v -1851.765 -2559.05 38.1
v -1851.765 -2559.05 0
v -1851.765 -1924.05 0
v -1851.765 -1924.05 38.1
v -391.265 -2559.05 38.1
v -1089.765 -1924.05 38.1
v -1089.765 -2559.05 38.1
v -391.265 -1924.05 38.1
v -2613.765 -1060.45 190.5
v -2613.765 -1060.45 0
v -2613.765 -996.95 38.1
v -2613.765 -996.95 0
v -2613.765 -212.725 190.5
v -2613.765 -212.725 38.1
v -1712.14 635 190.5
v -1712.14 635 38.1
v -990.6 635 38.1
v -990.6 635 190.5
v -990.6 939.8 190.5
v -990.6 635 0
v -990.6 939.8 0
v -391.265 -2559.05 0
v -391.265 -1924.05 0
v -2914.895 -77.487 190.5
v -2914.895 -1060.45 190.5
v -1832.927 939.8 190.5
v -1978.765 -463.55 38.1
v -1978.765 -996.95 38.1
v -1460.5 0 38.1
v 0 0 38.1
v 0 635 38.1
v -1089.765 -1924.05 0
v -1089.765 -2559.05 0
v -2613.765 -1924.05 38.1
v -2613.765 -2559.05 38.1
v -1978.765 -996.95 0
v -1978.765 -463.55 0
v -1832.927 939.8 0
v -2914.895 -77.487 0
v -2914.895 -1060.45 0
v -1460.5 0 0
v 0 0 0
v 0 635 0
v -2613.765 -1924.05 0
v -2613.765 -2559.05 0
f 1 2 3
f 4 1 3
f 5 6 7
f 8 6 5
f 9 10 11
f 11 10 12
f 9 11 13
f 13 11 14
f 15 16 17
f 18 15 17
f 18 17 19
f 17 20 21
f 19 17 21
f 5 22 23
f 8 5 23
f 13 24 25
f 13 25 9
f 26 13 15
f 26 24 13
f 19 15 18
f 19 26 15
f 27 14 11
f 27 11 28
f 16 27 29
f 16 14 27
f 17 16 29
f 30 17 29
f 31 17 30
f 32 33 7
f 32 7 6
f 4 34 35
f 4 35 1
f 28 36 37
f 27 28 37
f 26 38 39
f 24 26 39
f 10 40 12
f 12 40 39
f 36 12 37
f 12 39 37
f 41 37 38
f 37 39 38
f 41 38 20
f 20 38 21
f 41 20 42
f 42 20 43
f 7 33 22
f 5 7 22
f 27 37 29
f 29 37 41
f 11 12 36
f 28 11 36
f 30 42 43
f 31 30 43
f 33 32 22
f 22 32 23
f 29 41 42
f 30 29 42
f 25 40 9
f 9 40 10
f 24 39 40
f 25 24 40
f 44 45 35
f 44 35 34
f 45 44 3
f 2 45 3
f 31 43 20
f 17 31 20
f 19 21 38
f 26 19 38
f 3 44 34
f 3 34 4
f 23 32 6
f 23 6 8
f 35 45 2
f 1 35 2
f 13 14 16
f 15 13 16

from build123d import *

# Parameters (mm, degrees)
F1_DEPTH = 38.1
F2_DEPTH = 190.5
F3_W     = 762
F3_H     = 635
F4_DEPTH = 38.1
F3_W_2   = 698.5


# Not quite as in the source:
# - a feature names something its author has since deleted; it is built from what else it names


with BuildPart() as f1:
    # F0 (on Top) → F1 (new body)
    with BuildSketch(Plane.XY):
        Polygon((-1460.5, 0), (0, 0), (0, 635), (-990.6, 635), (-1712.1399633702, 635), (-2613.764655485, -212.725), (-2613.764655485, -996.95), (-1978.764655485, -996.95), (-1978.764655485, -463.55), align=None)
    extrude(amount=F1_DEPTH)

    # F0 (on Top) → F2 (join)
    with BuildSketch(Plane.XY):
        Polygon((-1712.1399633702, 635), (-990.6, 635), (-990.6, 939.8), (-1832.9271457878, 939.8), (-2914.8946478161, -77.4868031215), (-2914.8946478161, -1060.45), (-2613.764655485, -1060.45), (-2613.764655485, -996.95), (-2613.764655485, -212.725), align=None)
    extrude(amount=F2_DEPTH)


with BuildPart() as f4:
    # F3 (on Top) → F4 (new body)
    with BuildSketch(Plane.XY):
        with Locations((-2232.764655485, -2241.55)):
            Rectangle(F3_W, F3_H)
    extrude(amount=F4_DEPTH)


with BuildPart() as f4b:
    # F3 (on Top) → F4, piece 2 (new body)
    with BuildSketch(Plane.XY):
        with Locations((-740.514655485, -2241.55)):
            Rectangle(F3_W_2, F3_H)
    extrude(amount=F4_DEPTH)


solid = Compound([f1.part, f4.part, f4b.part])
